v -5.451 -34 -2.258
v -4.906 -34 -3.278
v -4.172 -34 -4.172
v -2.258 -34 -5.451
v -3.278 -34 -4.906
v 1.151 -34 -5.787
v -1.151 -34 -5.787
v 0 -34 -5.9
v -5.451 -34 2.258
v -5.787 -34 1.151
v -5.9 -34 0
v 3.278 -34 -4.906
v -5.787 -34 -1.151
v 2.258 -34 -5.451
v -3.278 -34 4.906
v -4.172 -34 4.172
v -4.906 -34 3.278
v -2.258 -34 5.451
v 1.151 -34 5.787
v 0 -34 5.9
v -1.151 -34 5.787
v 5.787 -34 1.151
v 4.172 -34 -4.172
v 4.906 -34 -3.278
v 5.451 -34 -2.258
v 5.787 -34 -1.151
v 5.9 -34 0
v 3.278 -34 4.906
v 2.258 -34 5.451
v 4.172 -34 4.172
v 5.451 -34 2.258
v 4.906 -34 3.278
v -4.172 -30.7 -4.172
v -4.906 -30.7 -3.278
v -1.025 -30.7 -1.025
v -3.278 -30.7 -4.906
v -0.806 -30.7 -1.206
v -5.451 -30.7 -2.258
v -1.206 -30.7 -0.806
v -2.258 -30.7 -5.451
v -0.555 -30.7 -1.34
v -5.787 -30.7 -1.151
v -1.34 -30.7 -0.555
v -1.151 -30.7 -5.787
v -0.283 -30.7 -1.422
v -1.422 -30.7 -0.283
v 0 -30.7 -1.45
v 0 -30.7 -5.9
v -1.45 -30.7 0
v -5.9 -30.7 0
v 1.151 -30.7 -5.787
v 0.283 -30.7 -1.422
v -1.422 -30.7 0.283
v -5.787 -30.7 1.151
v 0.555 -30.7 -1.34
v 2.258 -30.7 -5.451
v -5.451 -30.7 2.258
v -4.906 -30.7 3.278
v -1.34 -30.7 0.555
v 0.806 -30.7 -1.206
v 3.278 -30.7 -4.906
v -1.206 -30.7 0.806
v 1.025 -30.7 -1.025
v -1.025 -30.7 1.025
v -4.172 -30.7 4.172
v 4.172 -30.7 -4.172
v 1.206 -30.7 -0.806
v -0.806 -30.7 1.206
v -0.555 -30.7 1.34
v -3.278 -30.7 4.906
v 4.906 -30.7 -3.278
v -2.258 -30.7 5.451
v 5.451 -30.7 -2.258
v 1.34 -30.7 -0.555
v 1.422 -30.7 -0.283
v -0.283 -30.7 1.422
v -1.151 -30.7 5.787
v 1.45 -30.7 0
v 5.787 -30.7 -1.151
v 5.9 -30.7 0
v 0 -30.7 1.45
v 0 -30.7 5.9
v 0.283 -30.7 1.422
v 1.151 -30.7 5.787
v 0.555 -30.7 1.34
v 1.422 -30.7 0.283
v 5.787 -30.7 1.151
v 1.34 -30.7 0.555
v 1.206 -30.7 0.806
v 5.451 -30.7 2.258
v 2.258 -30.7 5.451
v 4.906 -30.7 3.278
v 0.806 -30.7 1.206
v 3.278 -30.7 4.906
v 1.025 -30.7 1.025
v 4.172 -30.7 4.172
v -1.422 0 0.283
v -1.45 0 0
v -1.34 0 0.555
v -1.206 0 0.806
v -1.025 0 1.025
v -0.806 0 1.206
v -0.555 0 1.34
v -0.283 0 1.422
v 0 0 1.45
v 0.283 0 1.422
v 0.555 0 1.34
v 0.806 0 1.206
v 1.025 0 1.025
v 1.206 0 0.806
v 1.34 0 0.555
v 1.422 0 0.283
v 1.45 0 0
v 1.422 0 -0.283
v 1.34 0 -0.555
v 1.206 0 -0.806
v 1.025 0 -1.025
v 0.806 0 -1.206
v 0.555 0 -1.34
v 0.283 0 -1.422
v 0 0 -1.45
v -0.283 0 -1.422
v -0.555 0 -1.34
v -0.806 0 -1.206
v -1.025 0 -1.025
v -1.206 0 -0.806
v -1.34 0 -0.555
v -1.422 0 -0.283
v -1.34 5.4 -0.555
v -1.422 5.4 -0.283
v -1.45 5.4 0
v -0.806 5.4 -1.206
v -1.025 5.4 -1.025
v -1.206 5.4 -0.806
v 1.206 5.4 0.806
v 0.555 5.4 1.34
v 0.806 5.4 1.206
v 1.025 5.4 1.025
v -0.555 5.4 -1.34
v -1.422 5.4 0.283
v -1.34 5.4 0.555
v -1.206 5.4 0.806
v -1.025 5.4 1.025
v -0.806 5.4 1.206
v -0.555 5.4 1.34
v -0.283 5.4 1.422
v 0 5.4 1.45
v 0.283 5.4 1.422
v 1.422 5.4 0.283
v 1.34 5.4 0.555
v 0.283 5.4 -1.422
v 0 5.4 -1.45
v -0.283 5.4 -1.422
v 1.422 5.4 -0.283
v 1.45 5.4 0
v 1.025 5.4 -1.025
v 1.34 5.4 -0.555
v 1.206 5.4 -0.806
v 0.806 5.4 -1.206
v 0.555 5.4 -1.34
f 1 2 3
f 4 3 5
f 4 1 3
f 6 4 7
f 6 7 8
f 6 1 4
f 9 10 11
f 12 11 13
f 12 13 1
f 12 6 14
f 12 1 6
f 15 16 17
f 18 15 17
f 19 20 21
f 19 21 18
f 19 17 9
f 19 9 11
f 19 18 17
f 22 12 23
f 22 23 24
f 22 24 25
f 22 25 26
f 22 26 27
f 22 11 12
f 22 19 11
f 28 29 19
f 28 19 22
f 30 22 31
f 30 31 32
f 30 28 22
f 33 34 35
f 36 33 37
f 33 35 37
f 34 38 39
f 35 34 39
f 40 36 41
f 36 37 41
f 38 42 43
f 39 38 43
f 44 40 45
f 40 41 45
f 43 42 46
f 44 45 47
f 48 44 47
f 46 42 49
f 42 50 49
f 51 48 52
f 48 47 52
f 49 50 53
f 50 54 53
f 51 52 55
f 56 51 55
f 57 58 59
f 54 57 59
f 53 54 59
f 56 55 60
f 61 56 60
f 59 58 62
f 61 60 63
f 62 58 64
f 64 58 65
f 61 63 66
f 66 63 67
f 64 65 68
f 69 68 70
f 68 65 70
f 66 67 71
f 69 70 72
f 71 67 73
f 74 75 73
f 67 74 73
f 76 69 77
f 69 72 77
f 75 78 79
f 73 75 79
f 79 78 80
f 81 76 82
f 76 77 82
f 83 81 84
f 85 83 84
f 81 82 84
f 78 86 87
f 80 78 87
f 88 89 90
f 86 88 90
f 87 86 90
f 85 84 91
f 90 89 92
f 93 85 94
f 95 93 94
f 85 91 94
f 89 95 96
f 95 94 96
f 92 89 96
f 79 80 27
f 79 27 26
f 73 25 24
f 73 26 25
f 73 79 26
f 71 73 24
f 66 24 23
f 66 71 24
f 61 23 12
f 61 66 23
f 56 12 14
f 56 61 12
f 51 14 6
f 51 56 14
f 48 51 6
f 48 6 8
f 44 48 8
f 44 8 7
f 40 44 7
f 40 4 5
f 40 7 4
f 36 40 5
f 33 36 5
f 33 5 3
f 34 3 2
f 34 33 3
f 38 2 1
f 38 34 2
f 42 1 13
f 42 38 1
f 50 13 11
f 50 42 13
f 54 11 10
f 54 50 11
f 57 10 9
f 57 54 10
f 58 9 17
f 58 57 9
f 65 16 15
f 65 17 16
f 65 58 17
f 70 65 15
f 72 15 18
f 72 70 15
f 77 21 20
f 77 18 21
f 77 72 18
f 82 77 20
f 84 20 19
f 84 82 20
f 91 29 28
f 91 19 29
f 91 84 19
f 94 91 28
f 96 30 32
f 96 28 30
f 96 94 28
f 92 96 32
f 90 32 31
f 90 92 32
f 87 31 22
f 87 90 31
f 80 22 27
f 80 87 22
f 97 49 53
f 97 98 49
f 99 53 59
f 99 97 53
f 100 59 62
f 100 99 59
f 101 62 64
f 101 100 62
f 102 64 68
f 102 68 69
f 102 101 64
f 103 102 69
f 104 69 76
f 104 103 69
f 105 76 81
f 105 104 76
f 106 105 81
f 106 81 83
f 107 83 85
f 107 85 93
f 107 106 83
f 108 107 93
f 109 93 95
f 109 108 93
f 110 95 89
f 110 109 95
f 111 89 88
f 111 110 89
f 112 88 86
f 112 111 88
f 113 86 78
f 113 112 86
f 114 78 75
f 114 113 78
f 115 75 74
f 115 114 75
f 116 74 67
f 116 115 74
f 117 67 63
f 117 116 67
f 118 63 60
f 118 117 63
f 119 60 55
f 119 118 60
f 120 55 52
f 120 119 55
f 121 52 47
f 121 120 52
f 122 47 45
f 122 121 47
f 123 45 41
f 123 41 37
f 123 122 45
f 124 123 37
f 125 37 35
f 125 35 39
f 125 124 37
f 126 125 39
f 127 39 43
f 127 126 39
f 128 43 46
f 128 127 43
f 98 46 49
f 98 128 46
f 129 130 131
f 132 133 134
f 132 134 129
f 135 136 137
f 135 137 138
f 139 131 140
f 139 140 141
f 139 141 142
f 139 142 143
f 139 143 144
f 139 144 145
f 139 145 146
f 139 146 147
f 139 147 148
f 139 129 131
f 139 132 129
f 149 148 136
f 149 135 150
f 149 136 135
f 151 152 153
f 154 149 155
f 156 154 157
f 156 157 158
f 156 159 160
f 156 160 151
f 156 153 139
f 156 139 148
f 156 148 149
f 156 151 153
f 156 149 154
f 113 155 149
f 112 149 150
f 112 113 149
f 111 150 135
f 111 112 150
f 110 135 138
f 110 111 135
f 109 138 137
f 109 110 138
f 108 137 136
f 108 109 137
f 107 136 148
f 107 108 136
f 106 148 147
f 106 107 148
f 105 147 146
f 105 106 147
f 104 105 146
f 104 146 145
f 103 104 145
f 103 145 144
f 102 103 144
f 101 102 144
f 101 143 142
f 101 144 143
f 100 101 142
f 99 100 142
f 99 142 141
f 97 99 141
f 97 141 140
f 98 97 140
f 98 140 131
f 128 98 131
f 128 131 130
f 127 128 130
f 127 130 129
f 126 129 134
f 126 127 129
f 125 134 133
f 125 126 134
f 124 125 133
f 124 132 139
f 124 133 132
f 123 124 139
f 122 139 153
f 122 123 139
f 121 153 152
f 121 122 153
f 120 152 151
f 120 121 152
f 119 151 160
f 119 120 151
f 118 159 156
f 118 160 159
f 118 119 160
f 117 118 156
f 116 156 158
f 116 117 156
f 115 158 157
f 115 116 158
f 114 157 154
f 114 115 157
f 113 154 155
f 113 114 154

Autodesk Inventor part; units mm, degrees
ref_plane "YZ Plane" through (0, 0, 0) normal (1, 0, 0) x (0, 1, 0)
ref_plane "XZ Plane" through (0, 0, 0) normal (0, 1, 0) x (-1, 0, 0)
ref_plane "XY Plane" through (0, 0, 0) normal (0, 0, 1) x (1, 0, 0)
sketch "Boceto1" plane through (0, 0, 0) normal (0, 1, 0) x (-1, 0, 0)
  circle A0 centre (0, 0) radius 1.45
  dimension "d0" = 2.9
extrude "Extrusión1" add sketch "Boceto1" against normal blind 30.7
sketch "Boceto2" plane through (0, -30.7, 0) normal (0, -1, 0) x (1, 0, 0)
  circle A0 centre (0, 0) radius 5.9
  dimension "d3" = 11.8
extrude "Extrusión2" add sketch "Boceto2" along normal blind 3.3
sketch "Boceto3" plane through (0, 0, 0) normal (0, 1, 0) x (1, 0, 0)
  circle A0 centre (0, 0) radius 1.45 projected
  circle A1 centre (0, 0) radius 1.45
  dimension "d6" = 2.9
extrude "Extrusión3" add sketch "Boceto3" along normal blind 5.4
properties part number "Embolo" material "Aluminio 6061"
